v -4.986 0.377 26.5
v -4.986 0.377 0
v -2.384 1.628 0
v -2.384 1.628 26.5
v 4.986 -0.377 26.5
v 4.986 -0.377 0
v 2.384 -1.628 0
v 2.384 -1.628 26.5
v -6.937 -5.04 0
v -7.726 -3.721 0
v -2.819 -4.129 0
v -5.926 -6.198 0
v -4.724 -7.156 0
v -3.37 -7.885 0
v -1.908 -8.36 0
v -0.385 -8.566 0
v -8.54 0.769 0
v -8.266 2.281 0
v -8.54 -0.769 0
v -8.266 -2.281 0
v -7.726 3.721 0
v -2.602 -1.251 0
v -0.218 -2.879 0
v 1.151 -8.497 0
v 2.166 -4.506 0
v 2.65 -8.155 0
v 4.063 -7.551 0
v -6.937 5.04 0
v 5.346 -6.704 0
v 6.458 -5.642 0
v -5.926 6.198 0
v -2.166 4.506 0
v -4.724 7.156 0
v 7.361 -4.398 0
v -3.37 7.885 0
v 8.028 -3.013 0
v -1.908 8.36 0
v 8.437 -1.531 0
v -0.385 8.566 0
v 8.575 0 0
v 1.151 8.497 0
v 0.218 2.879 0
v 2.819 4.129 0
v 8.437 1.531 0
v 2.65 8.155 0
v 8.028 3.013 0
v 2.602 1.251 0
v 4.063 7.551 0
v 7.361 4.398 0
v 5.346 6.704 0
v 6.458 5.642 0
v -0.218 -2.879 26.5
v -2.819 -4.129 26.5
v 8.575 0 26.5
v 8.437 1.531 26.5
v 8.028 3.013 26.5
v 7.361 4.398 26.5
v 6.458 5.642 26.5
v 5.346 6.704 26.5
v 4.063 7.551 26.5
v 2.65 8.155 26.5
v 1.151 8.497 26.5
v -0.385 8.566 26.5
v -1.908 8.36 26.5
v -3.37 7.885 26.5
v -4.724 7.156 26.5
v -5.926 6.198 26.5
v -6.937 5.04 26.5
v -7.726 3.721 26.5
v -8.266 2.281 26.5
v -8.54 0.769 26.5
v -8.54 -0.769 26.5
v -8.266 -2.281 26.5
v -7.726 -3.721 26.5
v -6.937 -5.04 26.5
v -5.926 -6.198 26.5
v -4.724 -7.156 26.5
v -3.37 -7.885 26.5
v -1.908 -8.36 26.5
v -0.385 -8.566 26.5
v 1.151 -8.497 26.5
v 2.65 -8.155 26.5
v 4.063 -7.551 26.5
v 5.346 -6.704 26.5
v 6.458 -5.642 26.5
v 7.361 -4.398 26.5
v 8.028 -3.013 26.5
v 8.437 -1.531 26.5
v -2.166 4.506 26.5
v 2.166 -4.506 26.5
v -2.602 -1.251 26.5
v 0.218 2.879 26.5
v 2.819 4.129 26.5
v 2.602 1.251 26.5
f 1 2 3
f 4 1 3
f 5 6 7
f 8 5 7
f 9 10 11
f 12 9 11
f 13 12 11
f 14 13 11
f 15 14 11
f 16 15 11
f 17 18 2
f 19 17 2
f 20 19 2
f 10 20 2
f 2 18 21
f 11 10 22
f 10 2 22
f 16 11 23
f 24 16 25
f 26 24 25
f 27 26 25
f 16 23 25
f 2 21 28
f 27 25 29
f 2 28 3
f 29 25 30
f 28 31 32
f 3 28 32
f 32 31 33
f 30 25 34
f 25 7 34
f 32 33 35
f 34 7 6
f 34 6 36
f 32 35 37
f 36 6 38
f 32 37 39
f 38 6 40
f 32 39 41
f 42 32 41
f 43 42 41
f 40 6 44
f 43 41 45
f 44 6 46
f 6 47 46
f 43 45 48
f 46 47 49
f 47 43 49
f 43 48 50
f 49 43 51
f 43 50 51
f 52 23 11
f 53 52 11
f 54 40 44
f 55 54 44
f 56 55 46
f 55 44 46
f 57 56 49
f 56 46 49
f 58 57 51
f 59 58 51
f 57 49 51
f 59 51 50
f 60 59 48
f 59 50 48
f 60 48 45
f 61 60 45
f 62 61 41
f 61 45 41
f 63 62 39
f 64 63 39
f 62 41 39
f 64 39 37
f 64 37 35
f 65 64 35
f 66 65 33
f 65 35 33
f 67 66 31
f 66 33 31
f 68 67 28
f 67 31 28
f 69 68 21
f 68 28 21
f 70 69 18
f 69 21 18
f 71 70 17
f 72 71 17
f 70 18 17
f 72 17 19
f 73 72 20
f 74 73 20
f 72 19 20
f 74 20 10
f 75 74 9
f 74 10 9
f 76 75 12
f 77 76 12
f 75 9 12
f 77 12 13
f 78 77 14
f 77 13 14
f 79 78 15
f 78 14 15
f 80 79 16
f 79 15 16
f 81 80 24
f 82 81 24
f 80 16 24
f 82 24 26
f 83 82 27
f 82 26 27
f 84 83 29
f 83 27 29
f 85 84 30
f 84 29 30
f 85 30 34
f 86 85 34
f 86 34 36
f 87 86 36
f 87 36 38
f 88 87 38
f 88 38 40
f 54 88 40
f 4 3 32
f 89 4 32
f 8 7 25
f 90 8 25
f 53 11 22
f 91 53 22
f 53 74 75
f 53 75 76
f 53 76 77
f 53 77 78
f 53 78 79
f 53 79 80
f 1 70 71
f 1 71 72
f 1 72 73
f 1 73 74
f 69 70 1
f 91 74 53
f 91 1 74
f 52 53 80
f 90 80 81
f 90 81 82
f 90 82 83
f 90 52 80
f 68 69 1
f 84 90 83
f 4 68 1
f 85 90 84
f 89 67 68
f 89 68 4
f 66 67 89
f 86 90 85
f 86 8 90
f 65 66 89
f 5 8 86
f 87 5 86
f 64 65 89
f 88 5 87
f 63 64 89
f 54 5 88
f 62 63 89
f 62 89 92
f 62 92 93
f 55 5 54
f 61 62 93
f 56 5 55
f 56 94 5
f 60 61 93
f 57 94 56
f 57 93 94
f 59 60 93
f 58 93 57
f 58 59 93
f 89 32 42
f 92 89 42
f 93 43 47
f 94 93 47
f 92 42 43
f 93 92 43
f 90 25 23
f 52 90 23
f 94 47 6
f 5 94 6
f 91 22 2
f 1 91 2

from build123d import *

# Parameters (mm, degrees)
F0_R     = 8.575
F1_DEPTH = 26.5
F3_DEPTH = 26.5


with BuildPart() as f1:
    # F0 (on Top) → F1 (new body)
    with BuildSketch(Plane.XY):
        Circle(F0_R)
    extrude(amount=F1_DEPTH)

    # F2 (on face) → F3 (cut)
    with BuildSketch(Plane(origin=(0, 0, 0), x_dir=(1, 0, 0), z_dir=(0, 0, -1))):
        Polygon((4.9857674621, 0.3769917955), (2.3840555737, 1.6277629909), (2.6017118884, -1.2507711954), align=None)
        Polygon((2.819368203, -4.1293053818), (2.6017118884, -1.2507711954), (0.2176563146, -2.8785341864), align=None)
        Polygon((0.2176563146, -2.8785341864), (-2.3840555737, -1.6277629909), (-2.1663992591, -4.5062971773), align=None)
        Polygon((-2.3840555737, -1.6277629909), (-2.6017118884, 1.2507711954), (-4.9857674621, -0.3769917955), align=None)
        Polygon((2.3840555737, 1.6277629909), (-0.2176563146, 2.8785341864), (-2.6017118884, 1.2507711954), (-2.3840555737, -1.6277629909), (0.2176563146, -2.8785341864), (2.6017118884, -1.2507711954), align=None)
        Polygon((2.1663992591, 4.5062971773), (-0.2176563146, 2.8785341864), (2.3840555737, 1.6277629909), align=None)
        Polygon((-0.2176563146, 2.8785341864), (-2.819368203, 4.1293053818), (-2.6017118884, 1.2507711954), align=None)
    extrude(amount=-F3_DEPTH, mode=Mode.SUBTRACT)


solid = f1.part
